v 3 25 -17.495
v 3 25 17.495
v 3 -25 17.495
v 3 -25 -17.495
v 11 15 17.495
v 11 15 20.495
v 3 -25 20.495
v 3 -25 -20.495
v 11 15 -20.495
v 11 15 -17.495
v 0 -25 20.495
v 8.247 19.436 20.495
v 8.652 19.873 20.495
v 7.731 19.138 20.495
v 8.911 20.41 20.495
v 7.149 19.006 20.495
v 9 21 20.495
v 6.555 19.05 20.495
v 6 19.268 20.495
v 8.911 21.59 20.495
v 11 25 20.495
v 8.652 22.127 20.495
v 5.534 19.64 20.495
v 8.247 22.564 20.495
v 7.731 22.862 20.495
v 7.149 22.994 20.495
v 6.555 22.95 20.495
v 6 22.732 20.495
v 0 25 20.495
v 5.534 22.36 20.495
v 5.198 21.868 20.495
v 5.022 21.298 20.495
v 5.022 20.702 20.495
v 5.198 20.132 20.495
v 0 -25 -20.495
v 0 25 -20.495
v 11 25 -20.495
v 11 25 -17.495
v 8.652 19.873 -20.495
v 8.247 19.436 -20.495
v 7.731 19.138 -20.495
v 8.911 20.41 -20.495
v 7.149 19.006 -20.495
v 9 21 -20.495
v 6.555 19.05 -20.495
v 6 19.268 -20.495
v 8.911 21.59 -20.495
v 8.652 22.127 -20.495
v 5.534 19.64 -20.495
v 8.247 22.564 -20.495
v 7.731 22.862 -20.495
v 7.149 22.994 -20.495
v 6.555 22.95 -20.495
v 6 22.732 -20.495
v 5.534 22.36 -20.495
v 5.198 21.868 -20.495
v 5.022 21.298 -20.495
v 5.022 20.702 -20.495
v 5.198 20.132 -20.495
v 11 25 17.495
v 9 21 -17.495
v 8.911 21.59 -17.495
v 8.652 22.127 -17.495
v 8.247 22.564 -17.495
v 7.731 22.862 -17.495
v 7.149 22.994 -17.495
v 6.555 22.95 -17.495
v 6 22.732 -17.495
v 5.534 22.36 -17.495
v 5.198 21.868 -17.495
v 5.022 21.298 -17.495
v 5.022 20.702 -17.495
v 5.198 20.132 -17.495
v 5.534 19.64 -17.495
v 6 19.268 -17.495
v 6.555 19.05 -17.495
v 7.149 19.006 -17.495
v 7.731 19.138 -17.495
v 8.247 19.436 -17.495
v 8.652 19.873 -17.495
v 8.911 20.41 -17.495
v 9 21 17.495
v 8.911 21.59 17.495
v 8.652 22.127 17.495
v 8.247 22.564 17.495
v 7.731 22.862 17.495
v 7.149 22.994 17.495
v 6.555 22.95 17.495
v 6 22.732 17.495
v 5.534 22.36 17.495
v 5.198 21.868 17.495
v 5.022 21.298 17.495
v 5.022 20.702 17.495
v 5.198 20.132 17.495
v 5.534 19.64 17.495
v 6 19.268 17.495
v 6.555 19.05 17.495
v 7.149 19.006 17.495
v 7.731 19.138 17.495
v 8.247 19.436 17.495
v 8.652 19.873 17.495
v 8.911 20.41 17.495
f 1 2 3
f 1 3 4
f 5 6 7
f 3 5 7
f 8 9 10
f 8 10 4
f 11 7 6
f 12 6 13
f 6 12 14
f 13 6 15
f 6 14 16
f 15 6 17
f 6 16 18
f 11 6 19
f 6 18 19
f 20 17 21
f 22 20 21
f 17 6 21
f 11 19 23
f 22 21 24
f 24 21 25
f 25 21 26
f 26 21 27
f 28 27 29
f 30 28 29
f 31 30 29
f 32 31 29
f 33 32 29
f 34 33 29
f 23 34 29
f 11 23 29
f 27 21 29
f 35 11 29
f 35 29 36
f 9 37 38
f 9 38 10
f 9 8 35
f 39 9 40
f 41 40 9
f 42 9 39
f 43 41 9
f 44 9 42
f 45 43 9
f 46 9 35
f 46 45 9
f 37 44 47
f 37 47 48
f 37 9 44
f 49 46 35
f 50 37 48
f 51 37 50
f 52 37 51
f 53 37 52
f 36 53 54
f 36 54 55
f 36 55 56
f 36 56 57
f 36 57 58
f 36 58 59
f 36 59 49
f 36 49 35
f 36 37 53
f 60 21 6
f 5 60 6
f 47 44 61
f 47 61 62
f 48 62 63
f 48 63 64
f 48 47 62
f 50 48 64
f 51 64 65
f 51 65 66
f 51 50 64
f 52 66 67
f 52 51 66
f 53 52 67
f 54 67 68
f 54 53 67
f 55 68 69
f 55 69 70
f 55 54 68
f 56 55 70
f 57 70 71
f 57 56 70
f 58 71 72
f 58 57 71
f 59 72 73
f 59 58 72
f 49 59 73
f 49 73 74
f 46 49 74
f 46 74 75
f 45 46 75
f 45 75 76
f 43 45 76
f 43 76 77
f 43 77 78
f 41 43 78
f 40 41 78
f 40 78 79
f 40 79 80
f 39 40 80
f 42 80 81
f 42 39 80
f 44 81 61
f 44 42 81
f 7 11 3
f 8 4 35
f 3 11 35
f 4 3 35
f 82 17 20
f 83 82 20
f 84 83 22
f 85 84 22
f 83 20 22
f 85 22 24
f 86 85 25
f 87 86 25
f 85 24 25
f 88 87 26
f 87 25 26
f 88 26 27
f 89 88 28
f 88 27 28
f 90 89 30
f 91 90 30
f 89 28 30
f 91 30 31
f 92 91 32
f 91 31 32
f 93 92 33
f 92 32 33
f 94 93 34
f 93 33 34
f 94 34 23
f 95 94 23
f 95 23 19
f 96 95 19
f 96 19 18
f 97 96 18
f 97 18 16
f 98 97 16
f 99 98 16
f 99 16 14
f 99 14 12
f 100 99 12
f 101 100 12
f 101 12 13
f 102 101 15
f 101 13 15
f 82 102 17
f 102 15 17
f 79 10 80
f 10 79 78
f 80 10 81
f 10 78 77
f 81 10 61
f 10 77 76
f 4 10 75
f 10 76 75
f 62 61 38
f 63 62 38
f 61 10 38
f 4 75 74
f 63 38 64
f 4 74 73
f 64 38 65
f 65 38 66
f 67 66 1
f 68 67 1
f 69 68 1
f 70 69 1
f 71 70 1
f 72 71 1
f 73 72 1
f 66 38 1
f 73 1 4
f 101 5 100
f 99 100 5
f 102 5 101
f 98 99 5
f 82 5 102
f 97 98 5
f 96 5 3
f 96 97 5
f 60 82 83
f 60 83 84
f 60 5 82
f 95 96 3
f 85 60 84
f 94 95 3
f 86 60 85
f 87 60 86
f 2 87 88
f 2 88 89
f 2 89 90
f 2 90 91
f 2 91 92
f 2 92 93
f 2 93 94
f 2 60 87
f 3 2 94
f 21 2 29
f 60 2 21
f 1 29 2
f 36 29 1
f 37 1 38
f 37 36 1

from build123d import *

# Parameters (mm, degrees)
SKETCH1_W           = 40.99099099
SKETCH1_H           = 50
BOSS_EXTRUDE1_DEPTH = 3
BOSS_EXTRUDE3_DEPTH = 3
SKETCH4_R           = 2
CUT_EXTRUDE1_DEPTH  = 3


with BuildPart() as part:
    # Sketch1 → Boss-Extrude1 (new body)
    with BuildSketch(Plane(origin=(0, 0, 0), x_dir=(0, 0, -1), z_dir=(1, 0, 0))):
        Rectangle(SKETCH1_W, SKETCH1_H)
    extrude(amount=BOSS_EXTRUDE1_DEPTH)

    # Sketch3 → Boss-Extrude3 (add)
    with BuildSketch(Plane.XY.offset(20.495495495)):
        Polygon((3, 25), (11, 25), (11, 15), (3, -25), align=None)
    boss_extrude3 = extrude(amount=-BOSS_EXTRUDE3_DEPTH)

    # Sketch4 → Cut-Extrude1 (cut)
    with BuildSketch(Plane.XY.offset(20.495495495)):
        with Locations((7, 21)):
            Circle(SKETCH4_R)
    cut_extrude1 = extrude(amount=-CUT_EXTRUDE1_DEPTH, mode=Mode.SUBTRACT)

    # Mirror1: Boss-Extrude3, Cut-Extrude1 across plane
    add(boss_extrude3.mirror(Plane.XY))
    add(cut_extrude1.mirror(Plane.XY), mode=Mode.SUBTRACT)


solid = part.part
